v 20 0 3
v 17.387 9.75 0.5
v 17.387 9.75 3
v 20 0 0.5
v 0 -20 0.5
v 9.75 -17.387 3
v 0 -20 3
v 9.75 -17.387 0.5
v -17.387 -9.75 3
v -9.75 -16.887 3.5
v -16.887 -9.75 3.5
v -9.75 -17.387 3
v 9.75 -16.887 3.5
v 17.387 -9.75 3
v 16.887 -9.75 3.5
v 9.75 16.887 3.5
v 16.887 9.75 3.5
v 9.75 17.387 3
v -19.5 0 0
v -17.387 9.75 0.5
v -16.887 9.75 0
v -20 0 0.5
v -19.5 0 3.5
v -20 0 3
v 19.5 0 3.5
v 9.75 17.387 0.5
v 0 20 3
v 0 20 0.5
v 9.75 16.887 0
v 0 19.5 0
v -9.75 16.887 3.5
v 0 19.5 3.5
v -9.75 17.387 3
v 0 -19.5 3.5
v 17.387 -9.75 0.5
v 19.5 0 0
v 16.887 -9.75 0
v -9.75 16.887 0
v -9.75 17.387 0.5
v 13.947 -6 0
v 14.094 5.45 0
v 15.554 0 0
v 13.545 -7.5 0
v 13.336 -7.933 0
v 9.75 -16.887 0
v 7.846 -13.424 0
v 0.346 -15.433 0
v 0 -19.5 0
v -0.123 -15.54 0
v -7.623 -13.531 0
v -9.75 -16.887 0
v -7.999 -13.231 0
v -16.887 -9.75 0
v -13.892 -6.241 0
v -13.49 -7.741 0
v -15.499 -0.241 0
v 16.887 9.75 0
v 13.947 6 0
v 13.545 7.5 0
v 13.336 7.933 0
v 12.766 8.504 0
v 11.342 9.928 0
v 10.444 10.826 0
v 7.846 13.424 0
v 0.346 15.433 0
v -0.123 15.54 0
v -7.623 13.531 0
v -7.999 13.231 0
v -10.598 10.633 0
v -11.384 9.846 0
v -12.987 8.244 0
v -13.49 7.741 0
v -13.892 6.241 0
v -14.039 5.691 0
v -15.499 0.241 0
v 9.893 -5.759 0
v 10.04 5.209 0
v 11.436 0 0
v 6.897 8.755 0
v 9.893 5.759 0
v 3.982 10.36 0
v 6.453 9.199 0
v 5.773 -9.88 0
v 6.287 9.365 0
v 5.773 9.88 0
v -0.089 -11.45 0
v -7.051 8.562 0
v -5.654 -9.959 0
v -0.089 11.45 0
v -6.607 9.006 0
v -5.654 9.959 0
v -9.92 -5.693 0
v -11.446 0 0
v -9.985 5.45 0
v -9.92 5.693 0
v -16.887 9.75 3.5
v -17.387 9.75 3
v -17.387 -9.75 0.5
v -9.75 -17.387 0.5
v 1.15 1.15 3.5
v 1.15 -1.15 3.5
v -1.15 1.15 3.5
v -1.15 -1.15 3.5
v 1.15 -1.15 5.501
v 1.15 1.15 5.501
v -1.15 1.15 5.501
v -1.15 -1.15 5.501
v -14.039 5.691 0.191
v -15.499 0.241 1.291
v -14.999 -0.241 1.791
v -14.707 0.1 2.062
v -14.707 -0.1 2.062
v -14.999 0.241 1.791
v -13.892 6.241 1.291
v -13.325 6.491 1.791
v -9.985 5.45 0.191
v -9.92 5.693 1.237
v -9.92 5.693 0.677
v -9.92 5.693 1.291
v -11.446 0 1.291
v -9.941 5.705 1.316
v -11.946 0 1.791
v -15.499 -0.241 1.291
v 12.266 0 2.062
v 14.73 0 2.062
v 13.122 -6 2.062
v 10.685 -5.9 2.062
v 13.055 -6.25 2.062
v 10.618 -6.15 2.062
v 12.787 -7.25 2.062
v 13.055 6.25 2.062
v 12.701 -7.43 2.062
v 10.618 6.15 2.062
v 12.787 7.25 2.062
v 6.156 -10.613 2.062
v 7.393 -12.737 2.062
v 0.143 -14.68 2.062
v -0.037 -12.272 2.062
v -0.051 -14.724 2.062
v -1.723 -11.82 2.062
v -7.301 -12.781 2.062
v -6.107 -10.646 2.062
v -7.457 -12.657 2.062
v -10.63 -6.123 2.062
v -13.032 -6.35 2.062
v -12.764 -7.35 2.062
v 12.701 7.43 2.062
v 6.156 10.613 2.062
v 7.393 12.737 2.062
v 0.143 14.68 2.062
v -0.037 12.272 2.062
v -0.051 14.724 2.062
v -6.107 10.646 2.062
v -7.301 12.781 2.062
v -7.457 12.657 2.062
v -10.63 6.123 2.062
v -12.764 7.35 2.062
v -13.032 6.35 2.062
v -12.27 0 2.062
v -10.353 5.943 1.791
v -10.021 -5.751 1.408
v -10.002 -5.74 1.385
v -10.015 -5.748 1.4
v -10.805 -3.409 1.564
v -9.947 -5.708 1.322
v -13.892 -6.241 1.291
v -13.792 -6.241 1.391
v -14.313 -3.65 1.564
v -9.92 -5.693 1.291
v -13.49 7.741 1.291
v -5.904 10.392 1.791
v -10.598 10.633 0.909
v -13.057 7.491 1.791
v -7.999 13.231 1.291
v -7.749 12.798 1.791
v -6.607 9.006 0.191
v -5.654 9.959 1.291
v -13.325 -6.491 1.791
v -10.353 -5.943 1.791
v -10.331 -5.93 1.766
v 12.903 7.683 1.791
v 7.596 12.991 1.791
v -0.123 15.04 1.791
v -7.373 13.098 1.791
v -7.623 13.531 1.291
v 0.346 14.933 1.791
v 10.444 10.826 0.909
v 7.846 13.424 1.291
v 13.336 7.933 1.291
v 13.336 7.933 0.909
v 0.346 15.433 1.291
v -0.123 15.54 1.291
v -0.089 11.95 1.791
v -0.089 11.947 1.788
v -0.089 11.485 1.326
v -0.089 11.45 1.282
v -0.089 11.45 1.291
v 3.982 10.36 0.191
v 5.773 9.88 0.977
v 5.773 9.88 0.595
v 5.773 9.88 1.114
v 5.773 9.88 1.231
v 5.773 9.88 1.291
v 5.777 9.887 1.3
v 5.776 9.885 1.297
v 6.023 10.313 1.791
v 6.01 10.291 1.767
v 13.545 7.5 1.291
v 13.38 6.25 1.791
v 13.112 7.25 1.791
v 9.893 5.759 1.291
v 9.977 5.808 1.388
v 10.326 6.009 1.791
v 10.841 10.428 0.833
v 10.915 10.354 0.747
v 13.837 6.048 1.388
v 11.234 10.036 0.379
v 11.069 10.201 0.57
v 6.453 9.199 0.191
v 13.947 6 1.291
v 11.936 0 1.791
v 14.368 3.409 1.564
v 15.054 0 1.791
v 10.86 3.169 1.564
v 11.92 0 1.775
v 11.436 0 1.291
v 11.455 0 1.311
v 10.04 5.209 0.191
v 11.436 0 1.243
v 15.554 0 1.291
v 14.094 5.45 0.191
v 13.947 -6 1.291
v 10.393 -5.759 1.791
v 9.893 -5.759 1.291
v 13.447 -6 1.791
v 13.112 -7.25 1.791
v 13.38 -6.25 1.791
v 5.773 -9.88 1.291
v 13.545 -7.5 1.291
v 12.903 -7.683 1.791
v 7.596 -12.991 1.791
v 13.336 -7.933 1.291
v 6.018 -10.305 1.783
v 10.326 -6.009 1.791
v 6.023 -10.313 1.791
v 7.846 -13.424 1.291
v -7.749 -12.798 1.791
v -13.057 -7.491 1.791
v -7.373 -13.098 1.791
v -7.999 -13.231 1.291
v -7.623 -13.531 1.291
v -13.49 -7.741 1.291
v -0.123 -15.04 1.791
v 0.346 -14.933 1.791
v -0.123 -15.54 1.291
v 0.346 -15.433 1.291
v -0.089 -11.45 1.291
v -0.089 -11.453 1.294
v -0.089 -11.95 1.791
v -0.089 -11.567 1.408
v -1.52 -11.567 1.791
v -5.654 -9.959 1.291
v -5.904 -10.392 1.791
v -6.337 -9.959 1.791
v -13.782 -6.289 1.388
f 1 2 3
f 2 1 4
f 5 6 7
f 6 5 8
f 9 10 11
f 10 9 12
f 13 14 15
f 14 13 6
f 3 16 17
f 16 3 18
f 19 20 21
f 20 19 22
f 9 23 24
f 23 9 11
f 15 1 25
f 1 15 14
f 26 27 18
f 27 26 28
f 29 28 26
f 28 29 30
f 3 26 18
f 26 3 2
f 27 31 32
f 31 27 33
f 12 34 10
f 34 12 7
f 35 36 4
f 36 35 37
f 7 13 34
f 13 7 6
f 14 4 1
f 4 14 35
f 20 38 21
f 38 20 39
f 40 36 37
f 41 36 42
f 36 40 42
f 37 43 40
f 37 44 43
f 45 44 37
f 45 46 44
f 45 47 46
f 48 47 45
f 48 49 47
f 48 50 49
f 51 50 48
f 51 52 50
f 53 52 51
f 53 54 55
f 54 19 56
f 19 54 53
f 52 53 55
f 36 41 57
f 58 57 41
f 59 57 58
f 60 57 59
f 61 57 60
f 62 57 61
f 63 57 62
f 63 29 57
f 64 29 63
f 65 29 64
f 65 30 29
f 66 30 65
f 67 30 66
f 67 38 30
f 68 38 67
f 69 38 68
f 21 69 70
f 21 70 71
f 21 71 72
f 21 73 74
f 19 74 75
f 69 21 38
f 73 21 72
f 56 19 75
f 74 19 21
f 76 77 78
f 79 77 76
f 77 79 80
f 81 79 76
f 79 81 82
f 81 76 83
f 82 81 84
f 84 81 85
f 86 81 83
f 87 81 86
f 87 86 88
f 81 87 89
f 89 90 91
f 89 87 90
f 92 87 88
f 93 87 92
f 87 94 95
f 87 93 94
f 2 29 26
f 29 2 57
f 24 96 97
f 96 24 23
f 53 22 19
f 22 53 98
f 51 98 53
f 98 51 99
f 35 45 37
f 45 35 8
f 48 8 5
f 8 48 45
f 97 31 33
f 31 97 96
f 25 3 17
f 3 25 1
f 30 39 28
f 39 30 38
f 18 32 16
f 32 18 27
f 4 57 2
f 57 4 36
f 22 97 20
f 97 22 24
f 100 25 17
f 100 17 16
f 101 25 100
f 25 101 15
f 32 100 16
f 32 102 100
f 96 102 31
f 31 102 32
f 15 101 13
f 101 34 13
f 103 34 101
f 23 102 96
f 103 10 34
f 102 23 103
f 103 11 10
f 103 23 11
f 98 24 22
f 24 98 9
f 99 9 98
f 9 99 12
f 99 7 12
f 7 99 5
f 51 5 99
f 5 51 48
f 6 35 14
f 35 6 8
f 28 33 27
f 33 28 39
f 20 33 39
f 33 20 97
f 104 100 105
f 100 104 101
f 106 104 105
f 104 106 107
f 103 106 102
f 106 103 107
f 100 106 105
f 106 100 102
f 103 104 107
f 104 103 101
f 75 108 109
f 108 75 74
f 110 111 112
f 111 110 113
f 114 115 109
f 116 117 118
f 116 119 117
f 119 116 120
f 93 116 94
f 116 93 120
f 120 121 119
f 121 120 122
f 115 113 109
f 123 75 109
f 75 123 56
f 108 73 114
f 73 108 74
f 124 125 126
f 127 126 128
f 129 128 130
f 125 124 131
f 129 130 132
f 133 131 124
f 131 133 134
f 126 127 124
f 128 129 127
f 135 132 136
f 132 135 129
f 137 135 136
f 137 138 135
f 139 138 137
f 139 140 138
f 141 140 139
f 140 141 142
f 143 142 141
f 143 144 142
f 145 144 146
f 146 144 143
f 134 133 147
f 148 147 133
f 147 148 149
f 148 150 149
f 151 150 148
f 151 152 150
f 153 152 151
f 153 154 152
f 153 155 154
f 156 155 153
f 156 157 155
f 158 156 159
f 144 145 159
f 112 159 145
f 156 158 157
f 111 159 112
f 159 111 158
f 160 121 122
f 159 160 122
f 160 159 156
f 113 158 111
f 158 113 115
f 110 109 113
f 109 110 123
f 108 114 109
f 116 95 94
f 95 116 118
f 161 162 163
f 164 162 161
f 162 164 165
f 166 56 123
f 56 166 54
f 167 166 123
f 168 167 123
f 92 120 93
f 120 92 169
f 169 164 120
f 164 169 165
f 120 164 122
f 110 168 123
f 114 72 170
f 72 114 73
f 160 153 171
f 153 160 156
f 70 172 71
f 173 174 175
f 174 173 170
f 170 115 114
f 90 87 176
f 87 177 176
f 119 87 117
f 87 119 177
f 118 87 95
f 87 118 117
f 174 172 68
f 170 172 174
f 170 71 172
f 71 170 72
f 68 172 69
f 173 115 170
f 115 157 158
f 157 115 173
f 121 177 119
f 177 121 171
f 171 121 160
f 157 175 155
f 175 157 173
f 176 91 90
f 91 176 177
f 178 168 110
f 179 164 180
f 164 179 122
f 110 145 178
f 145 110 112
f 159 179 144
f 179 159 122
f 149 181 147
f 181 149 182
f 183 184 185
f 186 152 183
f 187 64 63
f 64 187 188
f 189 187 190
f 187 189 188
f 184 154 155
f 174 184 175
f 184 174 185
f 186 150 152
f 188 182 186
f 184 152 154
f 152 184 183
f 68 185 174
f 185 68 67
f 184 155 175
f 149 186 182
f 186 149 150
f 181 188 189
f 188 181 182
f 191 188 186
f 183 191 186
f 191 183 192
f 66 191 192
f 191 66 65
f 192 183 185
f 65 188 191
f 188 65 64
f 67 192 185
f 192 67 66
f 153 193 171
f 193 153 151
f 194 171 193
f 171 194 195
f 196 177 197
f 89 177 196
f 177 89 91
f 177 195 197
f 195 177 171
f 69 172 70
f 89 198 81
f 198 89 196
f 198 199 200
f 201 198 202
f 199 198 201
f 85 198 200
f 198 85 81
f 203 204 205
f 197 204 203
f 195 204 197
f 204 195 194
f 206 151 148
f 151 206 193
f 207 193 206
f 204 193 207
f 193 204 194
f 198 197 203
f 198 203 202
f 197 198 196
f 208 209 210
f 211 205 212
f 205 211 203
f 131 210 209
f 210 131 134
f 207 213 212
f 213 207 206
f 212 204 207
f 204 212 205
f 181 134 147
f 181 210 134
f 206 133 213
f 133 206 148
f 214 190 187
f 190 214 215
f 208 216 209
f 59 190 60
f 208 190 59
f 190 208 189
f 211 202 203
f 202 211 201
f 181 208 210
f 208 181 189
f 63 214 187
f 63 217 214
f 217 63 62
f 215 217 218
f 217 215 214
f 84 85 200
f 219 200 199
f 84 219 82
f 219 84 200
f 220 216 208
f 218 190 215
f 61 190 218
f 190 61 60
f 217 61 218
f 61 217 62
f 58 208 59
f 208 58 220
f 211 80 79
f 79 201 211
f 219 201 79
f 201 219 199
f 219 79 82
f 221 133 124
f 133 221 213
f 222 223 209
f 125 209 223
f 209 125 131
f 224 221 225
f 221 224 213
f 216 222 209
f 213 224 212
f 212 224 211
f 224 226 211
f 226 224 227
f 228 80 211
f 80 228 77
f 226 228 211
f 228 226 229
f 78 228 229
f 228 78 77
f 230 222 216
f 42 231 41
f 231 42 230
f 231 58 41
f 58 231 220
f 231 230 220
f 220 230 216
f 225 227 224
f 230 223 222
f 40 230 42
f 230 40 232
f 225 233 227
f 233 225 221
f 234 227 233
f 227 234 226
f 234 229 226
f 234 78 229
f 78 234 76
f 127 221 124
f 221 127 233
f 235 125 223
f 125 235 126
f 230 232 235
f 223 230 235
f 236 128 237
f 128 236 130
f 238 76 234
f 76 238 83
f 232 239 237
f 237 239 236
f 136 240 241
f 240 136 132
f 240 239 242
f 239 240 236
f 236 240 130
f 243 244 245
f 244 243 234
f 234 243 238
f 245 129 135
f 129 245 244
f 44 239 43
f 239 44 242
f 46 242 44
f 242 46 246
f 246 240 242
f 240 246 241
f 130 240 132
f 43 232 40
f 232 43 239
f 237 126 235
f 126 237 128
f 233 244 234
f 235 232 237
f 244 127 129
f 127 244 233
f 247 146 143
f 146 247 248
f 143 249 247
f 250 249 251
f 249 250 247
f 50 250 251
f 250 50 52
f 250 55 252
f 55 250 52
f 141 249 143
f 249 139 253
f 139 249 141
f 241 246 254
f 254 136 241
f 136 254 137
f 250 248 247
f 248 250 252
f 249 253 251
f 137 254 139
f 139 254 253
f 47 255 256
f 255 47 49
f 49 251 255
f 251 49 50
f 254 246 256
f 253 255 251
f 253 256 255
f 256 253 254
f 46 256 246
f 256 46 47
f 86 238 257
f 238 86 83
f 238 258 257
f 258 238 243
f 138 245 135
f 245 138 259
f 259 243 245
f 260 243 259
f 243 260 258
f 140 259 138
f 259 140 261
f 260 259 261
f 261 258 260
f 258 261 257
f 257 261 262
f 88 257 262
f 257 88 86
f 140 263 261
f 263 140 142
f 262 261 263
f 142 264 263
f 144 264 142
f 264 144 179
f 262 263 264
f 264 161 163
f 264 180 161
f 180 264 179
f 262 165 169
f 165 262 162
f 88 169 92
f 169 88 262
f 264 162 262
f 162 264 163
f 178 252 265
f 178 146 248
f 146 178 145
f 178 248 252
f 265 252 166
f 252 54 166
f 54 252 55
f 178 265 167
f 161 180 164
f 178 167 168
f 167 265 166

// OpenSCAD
// file: common.scad
// Unless otherwise specified, each resulting shape is
// resting on the XY plane, centered on the Z axis.

// A small amount to make sure shapes overlap when needed. This
// is well below the resolution of my 3D printer, so it
// shouldn't affect the final result.
eps = 0.001;

// If printing, use high quality renderings.
print = false;
$fa = print ? 5 : 30;
$fs = print ? 0.3 : 1;

// Standard chamfer on all edges and corners. This makes the
// pieces more comfortable to handle.
chamfer = 0.5;

// A regular octahedron centered on the origin with its vertices
// on the axes. 'axis' gives its full length along each axis.
module octahedron(axis) {
  // Top and bottom halves.
  for (a = [-1, 1])
    scale([1, 1, a])
      // Extrude a square into a pyramid.
      linear_extrude(axis/2, scale=0)
        rotate([0, 0, 45])
          square(norm([axis/2, axis/2]), center=true);
}

// 'd' is the outer dimensions of the box.
module chamfered_box(d) {
  assert(d.x >= 1);
  assert(d.y >= 1);
  assert(d.z >= 1);

  // Raise the result up so it is resting on the XY plane.
  translate([0, 0, d.z/2]) {
    minkowski() {
      // The desired cube, scaled back by the chamfer distance
      // in all directions.
      cube(d - [chamfer*2, chamfer*2, chamfer*2], center=true);
      octahedron(chamfer*2);
    }
  }
}

module chamfered_disk(height, radius) {
  assert(radius >= 0.5);
  assert(height >= 1);

  // Raise the result up so it is resting on the XY plane.
  translate([0, 0, height/2]) {
    minkowski() {
      // The desired disk, scaled back by the chamfer distance
      // in all directions.
      cylinder(height-chamfer*2, r=radius-chamfer, center=true);
      octahedron(chamfer*2);
    }
  }
}

locking_lug_dims = [2.3, 2.3, 2+2*eps];

// A snug fit for gluing.
module locking_lug() {
  translate([0, 0, locking_lug_dims.z/2-eps])
    cube(locking_lug_dims, center=true);
}
module locking_socket() {
  // Make extra sure the lug will fit all the way into
  // the hole.
  extra_depth = 0.4;
  translate([0, 0, (locking_lug_dims.z+extra_depth)/2-eps])
    cube(locking_lug_dims + [0.2, 0.2, extra_depth],
         center=true);
}
// main file
include <common.scad>

module ring() {
  rotate_extrude(angle=360)
    translate([12, 0, 0])
      polygon([
        [0, 0],
        [3, 0],
        [3, 1.1],
        [2.5, 1.6],
        [0.5, 1.6],
        [0, 1.1],
      ]);
}

module ring_hole() {
  minkowski() {
    ring();
    // Widen the hole slightly to accommodate imperfect circles
    // with some looseness.
    scale([0.6, 0.6, 0.5])
      sphere(1);
  }
}

module base(lug=true) {
  difference() {
    union() {
      chamfered_disk(3.5, 20);
      
      // A lug for gluing a body.
      if (lug)
        translate([0, 0, 3.5])
          locking_lug();
    }
    ring_hole();
  }
}

module base_chip() {
  base(lug=false);
  translate([0, 0, 3.5])
    ring();
}

// Demo.
base();
